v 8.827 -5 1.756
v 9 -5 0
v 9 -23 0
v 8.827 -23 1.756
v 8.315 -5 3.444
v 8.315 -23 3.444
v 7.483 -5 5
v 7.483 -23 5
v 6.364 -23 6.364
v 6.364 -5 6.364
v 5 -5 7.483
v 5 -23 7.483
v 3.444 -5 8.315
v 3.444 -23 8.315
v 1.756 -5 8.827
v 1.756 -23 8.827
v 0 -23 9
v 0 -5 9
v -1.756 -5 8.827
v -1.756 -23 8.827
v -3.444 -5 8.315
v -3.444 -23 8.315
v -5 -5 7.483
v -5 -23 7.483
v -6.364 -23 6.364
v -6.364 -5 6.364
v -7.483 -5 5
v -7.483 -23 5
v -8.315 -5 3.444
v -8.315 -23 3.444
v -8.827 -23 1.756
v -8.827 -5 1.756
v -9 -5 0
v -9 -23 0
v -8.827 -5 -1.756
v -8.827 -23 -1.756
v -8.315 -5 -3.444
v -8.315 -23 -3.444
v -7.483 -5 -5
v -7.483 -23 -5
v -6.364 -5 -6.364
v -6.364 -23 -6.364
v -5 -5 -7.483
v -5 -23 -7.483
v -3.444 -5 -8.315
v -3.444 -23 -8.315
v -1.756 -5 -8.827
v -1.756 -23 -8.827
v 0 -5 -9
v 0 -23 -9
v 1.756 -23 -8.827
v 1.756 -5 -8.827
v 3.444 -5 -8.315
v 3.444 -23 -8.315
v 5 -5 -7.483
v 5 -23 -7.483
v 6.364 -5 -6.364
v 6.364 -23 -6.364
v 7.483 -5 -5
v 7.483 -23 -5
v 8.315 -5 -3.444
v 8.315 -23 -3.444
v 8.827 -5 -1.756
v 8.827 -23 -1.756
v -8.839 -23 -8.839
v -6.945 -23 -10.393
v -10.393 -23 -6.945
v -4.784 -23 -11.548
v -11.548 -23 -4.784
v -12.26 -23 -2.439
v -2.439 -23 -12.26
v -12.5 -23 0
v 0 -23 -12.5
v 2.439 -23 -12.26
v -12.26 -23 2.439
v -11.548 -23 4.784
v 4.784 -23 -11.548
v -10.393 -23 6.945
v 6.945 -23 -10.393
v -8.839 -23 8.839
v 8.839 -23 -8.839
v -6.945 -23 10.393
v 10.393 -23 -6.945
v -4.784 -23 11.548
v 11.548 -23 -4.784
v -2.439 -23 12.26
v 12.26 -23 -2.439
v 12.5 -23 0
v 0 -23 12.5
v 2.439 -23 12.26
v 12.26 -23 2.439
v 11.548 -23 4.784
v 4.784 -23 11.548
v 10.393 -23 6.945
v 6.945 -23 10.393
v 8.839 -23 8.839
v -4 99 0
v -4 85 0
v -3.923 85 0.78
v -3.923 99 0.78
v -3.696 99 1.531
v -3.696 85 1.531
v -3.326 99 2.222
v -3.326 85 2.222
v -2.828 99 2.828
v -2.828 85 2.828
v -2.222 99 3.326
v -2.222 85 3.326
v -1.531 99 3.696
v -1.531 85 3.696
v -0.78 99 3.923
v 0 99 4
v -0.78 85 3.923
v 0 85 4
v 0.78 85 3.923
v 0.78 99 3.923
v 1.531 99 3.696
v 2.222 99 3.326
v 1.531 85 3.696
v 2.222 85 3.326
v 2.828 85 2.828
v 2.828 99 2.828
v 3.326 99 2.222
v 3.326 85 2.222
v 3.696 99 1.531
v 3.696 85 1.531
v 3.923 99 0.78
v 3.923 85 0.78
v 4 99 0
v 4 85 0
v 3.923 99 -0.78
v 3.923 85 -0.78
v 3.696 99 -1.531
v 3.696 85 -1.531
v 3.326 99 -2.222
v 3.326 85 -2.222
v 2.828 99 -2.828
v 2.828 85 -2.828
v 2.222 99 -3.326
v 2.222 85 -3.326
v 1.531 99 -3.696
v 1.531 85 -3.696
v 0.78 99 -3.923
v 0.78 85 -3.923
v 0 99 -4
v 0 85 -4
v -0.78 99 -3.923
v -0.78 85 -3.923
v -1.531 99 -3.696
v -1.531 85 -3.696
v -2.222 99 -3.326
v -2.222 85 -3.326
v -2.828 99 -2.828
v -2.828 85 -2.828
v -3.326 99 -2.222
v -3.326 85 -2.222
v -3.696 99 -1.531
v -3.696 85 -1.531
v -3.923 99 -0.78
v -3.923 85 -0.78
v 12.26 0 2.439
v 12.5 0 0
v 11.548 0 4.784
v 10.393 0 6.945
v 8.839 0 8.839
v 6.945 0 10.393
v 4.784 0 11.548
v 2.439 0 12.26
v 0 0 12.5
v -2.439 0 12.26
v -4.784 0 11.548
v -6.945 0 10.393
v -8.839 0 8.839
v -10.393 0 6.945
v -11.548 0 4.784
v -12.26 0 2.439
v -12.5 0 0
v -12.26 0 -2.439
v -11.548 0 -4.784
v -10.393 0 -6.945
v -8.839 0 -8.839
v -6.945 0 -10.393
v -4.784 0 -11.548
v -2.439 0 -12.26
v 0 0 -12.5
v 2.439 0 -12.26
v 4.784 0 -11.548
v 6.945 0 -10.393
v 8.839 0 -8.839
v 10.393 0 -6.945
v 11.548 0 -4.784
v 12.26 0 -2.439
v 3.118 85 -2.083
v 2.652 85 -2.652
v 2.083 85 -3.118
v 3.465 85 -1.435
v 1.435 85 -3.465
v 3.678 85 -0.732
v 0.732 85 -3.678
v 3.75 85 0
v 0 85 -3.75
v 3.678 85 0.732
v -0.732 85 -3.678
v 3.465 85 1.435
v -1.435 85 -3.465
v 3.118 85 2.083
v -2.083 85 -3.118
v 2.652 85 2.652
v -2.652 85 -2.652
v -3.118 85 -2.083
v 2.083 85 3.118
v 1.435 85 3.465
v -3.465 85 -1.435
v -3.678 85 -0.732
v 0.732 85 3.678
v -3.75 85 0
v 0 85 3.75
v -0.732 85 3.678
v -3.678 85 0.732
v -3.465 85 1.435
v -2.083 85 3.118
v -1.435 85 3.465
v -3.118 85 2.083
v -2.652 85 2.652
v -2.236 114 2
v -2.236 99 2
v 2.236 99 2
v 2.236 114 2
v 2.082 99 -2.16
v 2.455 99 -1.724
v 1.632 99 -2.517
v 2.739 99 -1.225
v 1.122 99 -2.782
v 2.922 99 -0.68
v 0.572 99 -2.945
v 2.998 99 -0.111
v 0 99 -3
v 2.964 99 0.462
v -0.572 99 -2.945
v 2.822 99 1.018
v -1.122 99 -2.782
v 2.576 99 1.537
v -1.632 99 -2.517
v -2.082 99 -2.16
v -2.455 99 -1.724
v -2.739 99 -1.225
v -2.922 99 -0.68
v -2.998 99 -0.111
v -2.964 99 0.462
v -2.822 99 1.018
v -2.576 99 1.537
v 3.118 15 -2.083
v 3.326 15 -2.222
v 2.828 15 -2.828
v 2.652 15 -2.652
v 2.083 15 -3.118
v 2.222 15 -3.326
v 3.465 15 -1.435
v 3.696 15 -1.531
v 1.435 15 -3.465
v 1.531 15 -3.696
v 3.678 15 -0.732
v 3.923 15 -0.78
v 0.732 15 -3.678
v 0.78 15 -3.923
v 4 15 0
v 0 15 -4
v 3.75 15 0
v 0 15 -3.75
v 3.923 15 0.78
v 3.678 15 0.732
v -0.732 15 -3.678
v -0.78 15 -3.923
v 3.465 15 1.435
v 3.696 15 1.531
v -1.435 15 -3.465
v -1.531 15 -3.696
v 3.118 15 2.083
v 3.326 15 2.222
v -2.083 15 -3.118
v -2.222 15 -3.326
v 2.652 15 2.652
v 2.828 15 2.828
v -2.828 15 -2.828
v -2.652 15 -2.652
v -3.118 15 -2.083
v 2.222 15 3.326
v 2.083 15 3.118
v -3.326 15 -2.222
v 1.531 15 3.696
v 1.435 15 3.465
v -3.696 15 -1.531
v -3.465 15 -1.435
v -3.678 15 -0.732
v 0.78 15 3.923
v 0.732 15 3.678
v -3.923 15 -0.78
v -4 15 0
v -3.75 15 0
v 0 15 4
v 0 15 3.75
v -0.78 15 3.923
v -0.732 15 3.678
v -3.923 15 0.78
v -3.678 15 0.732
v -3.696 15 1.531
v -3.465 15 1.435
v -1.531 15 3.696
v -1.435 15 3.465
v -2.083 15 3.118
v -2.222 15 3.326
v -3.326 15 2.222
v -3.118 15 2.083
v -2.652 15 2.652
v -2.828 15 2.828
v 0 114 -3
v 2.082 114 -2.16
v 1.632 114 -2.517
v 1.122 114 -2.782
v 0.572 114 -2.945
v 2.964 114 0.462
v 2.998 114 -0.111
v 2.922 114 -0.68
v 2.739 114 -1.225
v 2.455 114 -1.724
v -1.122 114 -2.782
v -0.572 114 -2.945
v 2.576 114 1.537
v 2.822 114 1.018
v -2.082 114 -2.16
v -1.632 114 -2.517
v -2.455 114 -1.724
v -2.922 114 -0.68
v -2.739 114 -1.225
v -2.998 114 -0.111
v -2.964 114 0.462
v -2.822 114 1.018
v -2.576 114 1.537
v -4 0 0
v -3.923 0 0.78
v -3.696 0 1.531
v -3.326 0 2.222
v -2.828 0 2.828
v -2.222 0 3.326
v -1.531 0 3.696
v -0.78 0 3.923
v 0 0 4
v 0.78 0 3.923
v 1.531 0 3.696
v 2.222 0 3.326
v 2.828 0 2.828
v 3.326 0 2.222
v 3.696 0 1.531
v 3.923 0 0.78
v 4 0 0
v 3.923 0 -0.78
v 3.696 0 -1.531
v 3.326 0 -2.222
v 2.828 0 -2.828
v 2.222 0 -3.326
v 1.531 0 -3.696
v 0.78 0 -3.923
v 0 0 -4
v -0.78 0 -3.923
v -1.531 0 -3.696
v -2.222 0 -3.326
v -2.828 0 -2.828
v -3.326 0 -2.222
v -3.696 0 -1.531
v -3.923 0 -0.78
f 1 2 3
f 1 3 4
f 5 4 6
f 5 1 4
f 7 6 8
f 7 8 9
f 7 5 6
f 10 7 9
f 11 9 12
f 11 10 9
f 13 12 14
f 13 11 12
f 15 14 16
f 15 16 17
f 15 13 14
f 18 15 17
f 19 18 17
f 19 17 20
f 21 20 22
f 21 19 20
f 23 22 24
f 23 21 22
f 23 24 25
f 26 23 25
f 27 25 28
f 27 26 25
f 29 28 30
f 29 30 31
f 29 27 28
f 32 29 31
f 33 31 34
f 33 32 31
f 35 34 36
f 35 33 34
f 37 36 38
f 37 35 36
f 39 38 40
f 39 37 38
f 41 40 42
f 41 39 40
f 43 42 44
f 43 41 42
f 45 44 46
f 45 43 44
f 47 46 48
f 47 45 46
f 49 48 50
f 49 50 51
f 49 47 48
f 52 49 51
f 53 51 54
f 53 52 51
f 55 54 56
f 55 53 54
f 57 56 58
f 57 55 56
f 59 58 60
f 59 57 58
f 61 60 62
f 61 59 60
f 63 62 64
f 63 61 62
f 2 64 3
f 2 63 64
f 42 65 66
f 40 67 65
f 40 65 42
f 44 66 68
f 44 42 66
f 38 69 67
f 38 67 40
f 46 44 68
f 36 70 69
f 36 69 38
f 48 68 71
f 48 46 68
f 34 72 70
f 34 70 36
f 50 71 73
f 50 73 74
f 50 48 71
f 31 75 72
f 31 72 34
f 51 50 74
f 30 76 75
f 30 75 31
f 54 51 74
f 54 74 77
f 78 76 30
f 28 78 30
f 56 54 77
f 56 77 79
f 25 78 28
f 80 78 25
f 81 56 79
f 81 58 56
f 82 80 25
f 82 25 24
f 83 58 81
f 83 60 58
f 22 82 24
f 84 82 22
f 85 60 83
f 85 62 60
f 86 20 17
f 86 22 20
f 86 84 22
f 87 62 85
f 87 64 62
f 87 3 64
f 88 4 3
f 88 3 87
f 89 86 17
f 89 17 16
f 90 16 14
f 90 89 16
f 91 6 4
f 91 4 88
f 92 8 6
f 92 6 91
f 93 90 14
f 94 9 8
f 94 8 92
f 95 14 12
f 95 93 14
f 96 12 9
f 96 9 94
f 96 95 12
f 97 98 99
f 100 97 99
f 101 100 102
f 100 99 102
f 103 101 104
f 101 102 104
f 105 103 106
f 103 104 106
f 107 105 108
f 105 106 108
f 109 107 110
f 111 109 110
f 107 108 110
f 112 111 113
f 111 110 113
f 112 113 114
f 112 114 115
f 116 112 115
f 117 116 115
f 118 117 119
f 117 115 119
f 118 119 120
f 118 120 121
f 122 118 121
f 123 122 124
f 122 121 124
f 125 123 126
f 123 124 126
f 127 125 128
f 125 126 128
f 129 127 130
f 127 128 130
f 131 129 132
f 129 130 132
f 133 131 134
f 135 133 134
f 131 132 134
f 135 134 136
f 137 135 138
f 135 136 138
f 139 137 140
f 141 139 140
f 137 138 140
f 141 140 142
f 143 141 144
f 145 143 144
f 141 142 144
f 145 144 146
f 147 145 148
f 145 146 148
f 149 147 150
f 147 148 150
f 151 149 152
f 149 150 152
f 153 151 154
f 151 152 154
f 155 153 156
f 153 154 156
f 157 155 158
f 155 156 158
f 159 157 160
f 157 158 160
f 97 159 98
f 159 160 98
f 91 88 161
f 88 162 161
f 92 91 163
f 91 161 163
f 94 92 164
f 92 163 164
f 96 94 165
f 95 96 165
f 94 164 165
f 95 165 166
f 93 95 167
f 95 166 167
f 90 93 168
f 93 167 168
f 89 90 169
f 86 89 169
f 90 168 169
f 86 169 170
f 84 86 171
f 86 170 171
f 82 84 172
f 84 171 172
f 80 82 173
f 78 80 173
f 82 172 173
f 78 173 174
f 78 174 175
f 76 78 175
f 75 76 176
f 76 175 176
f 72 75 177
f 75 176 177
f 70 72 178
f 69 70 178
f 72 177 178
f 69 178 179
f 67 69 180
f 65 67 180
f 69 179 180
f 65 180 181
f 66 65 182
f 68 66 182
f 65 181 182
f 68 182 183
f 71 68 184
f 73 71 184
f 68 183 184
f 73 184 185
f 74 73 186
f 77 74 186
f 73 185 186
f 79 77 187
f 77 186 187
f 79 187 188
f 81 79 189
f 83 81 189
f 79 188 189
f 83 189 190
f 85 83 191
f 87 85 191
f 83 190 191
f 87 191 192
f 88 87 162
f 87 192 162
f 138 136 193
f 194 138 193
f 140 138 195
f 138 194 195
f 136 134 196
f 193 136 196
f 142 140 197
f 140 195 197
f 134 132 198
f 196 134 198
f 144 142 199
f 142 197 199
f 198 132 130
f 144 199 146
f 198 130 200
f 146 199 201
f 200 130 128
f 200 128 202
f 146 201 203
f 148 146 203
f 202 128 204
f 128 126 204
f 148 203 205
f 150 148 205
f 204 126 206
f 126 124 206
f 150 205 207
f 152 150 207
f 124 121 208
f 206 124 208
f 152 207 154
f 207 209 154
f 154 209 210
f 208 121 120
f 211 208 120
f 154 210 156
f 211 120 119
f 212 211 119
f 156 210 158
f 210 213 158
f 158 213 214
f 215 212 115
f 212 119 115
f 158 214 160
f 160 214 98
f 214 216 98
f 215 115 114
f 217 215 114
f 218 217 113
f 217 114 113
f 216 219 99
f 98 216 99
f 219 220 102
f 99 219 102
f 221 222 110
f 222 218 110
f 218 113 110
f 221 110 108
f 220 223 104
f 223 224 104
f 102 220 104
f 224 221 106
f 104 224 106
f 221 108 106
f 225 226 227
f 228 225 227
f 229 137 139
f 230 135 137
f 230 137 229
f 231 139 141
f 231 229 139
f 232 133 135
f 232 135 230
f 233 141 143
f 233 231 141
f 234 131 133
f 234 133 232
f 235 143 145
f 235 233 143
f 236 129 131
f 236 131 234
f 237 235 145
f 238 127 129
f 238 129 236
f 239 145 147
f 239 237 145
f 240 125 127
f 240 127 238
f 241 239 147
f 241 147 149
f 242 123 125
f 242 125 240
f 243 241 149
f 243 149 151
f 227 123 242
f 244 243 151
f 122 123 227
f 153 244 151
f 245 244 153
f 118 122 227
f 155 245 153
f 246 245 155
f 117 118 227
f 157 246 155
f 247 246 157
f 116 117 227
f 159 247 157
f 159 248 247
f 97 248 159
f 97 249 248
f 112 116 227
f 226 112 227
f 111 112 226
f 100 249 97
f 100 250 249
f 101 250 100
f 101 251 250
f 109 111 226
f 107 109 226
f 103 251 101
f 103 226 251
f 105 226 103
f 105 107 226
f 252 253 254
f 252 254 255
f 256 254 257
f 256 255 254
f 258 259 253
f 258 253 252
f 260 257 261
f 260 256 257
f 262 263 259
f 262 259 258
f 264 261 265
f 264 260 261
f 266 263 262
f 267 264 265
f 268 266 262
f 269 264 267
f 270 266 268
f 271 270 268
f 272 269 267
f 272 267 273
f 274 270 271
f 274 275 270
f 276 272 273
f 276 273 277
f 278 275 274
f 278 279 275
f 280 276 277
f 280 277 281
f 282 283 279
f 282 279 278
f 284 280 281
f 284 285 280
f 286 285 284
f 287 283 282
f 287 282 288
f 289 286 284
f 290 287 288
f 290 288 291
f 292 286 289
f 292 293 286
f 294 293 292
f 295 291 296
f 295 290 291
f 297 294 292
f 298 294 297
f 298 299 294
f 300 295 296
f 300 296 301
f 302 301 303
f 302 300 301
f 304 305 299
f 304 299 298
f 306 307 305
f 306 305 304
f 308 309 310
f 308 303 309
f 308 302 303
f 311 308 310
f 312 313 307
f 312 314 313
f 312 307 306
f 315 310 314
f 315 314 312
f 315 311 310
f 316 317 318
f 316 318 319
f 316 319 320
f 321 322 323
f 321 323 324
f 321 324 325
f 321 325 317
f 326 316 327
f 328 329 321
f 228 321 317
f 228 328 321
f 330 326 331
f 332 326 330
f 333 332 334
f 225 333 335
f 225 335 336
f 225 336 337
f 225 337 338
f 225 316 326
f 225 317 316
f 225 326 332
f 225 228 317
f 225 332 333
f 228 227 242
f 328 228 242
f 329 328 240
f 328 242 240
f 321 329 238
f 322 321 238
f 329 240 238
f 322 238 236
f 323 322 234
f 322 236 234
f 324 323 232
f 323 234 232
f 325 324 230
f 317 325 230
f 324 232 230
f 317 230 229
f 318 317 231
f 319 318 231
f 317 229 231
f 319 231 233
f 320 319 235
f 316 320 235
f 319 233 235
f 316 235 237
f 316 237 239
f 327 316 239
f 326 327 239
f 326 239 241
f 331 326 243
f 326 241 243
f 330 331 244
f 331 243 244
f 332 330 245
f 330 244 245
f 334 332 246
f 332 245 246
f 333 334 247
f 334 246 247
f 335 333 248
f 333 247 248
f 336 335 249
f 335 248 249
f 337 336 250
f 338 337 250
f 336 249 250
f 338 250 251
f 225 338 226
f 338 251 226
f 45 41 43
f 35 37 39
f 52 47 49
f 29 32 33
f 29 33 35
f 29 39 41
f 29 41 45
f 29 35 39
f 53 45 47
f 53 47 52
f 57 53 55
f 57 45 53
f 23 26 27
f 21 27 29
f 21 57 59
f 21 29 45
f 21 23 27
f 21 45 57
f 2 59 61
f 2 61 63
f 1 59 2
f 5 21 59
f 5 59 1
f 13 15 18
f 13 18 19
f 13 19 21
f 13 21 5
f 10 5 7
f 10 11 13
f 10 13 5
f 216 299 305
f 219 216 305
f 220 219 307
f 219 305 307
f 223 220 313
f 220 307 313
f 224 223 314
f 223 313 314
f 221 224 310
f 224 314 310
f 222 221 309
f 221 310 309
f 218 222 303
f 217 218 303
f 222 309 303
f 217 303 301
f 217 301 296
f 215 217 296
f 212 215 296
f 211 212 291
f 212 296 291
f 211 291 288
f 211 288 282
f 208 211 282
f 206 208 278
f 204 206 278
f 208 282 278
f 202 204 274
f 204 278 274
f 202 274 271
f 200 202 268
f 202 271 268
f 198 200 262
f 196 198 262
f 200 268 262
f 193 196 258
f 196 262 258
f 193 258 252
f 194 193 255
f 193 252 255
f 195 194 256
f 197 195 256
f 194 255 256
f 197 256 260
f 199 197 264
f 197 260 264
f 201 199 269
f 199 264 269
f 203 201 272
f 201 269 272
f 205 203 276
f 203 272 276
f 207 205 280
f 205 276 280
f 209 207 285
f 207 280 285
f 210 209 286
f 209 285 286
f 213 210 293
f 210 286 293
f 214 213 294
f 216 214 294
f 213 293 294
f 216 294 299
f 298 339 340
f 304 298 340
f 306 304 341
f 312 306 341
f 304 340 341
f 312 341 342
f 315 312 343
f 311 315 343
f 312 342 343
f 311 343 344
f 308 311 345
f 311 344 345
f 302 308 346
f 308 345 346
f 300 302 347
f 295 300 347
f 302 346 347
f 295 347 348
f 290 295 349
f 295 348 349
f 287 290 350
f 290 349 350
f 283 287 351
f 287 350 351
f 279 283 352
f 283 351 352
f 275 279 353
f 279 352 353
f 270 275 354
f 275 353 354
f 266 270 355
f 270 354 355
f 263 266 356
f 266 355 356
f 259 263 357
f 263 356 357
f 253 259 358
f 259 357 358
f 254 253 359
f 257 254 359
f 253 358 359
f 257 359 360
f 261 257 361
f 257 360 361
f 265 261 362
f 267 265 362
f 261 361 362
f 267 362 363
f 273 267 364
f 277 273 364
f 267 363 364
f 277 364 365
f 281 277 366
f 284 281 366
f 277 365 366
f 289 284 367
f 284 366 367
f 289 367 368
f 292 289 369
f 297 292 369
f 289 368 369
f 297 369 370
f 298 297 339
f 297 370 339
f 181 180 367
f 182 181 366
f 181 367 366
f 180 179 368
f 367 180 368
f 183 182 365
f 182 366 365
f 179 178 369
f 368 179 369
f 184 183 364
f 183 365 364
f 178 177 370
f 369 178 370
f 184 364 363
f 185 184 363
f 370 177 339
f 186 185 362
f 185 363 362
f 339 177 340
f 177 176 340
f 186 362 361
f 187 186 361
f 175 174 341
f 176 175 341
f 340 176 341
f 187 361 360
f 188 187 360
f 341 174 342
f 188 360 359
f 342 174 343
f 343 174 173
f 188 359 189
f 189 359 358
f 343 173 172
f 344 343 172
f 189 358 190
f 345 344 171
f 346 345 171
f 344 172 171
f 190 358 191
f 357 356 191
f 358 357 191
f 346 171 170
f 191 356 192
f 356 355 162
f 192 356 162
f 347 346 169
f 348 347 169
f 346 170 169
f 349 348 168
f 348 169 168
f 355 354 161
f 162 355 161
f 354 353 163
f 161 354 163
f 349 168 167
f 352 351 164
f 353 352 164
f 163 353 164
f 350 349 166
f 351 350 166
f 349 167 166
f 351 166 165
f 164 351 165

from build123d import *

# Parameters (mm, degrees)
F0_R      = 12.5
F1_DEPTH  = 5
F2_R      = 12.5
F2_R_2    = 9
F3_DEPTH  = 18
F4_R      = 4
F5_DEPTH  = 15
F6_R      = 3.75
F7_DEPTH  = 70
F8_R      = 4
F9_DEPTH  = 14
F11_DEPTH = 15


with BuildPart() as f1:
    # F0 (on Front) → F1 (new body)
    with BuildSketch(Plane.XZ):
        Circle(F0_R)
    extrude(amount=F1_DEPTH)

    # F2 (on face) → F3 (join)
    with BuildSketch(Plane.XZ.offset(5)):
        Circle(F2_R)
        Circle(F2_R_2, mode=Mode.SUBTRACT)
    extrude(amount=F3_DEPTH)

    # F4 (on face) → F5 (join)
    with BuildSketch(Plane(origin=(0, 0, 0), x_dir=(-1, 0, 0), z_dir=(0, 1, 0))):
        Circle(F4_R)
    extrude(amount=F5_DEPTH)

    # F6 (on face) → F7 (join)
    with BuildSketch(Plane(origin=(0, 15, 0), x_dir=(-1, 0, 0), z_dir=(0, 1, 0))):
        Circle(F6_R)
    extrude(amount=F7_DEPTH)

    # F8 (on face) → F9 (join)
    with BuildSketch(Plane(origin=(0, 85, 0), x_dir=(-1, 0, 0), z_dir=(0, 1, 0))):
        Circle(F8_R)
    extrude(amount=F9_DEPTH)

    # F10 (on face) → F11 (join)
    with BuildSketch(Plane(origin=(0, 99, 0), x_dir=(-1, 0, 0), z_dir=(0, 1, 0))):
        with BuildLine():
            Line((2.236068, 2), (-2.236068, 2))
            ThreePointArc((-2.236068, 2), (0, -3), (2.236068, 2))
        make_face()
    extrude(amount=F11_DEPTH)


solid = f1.part
